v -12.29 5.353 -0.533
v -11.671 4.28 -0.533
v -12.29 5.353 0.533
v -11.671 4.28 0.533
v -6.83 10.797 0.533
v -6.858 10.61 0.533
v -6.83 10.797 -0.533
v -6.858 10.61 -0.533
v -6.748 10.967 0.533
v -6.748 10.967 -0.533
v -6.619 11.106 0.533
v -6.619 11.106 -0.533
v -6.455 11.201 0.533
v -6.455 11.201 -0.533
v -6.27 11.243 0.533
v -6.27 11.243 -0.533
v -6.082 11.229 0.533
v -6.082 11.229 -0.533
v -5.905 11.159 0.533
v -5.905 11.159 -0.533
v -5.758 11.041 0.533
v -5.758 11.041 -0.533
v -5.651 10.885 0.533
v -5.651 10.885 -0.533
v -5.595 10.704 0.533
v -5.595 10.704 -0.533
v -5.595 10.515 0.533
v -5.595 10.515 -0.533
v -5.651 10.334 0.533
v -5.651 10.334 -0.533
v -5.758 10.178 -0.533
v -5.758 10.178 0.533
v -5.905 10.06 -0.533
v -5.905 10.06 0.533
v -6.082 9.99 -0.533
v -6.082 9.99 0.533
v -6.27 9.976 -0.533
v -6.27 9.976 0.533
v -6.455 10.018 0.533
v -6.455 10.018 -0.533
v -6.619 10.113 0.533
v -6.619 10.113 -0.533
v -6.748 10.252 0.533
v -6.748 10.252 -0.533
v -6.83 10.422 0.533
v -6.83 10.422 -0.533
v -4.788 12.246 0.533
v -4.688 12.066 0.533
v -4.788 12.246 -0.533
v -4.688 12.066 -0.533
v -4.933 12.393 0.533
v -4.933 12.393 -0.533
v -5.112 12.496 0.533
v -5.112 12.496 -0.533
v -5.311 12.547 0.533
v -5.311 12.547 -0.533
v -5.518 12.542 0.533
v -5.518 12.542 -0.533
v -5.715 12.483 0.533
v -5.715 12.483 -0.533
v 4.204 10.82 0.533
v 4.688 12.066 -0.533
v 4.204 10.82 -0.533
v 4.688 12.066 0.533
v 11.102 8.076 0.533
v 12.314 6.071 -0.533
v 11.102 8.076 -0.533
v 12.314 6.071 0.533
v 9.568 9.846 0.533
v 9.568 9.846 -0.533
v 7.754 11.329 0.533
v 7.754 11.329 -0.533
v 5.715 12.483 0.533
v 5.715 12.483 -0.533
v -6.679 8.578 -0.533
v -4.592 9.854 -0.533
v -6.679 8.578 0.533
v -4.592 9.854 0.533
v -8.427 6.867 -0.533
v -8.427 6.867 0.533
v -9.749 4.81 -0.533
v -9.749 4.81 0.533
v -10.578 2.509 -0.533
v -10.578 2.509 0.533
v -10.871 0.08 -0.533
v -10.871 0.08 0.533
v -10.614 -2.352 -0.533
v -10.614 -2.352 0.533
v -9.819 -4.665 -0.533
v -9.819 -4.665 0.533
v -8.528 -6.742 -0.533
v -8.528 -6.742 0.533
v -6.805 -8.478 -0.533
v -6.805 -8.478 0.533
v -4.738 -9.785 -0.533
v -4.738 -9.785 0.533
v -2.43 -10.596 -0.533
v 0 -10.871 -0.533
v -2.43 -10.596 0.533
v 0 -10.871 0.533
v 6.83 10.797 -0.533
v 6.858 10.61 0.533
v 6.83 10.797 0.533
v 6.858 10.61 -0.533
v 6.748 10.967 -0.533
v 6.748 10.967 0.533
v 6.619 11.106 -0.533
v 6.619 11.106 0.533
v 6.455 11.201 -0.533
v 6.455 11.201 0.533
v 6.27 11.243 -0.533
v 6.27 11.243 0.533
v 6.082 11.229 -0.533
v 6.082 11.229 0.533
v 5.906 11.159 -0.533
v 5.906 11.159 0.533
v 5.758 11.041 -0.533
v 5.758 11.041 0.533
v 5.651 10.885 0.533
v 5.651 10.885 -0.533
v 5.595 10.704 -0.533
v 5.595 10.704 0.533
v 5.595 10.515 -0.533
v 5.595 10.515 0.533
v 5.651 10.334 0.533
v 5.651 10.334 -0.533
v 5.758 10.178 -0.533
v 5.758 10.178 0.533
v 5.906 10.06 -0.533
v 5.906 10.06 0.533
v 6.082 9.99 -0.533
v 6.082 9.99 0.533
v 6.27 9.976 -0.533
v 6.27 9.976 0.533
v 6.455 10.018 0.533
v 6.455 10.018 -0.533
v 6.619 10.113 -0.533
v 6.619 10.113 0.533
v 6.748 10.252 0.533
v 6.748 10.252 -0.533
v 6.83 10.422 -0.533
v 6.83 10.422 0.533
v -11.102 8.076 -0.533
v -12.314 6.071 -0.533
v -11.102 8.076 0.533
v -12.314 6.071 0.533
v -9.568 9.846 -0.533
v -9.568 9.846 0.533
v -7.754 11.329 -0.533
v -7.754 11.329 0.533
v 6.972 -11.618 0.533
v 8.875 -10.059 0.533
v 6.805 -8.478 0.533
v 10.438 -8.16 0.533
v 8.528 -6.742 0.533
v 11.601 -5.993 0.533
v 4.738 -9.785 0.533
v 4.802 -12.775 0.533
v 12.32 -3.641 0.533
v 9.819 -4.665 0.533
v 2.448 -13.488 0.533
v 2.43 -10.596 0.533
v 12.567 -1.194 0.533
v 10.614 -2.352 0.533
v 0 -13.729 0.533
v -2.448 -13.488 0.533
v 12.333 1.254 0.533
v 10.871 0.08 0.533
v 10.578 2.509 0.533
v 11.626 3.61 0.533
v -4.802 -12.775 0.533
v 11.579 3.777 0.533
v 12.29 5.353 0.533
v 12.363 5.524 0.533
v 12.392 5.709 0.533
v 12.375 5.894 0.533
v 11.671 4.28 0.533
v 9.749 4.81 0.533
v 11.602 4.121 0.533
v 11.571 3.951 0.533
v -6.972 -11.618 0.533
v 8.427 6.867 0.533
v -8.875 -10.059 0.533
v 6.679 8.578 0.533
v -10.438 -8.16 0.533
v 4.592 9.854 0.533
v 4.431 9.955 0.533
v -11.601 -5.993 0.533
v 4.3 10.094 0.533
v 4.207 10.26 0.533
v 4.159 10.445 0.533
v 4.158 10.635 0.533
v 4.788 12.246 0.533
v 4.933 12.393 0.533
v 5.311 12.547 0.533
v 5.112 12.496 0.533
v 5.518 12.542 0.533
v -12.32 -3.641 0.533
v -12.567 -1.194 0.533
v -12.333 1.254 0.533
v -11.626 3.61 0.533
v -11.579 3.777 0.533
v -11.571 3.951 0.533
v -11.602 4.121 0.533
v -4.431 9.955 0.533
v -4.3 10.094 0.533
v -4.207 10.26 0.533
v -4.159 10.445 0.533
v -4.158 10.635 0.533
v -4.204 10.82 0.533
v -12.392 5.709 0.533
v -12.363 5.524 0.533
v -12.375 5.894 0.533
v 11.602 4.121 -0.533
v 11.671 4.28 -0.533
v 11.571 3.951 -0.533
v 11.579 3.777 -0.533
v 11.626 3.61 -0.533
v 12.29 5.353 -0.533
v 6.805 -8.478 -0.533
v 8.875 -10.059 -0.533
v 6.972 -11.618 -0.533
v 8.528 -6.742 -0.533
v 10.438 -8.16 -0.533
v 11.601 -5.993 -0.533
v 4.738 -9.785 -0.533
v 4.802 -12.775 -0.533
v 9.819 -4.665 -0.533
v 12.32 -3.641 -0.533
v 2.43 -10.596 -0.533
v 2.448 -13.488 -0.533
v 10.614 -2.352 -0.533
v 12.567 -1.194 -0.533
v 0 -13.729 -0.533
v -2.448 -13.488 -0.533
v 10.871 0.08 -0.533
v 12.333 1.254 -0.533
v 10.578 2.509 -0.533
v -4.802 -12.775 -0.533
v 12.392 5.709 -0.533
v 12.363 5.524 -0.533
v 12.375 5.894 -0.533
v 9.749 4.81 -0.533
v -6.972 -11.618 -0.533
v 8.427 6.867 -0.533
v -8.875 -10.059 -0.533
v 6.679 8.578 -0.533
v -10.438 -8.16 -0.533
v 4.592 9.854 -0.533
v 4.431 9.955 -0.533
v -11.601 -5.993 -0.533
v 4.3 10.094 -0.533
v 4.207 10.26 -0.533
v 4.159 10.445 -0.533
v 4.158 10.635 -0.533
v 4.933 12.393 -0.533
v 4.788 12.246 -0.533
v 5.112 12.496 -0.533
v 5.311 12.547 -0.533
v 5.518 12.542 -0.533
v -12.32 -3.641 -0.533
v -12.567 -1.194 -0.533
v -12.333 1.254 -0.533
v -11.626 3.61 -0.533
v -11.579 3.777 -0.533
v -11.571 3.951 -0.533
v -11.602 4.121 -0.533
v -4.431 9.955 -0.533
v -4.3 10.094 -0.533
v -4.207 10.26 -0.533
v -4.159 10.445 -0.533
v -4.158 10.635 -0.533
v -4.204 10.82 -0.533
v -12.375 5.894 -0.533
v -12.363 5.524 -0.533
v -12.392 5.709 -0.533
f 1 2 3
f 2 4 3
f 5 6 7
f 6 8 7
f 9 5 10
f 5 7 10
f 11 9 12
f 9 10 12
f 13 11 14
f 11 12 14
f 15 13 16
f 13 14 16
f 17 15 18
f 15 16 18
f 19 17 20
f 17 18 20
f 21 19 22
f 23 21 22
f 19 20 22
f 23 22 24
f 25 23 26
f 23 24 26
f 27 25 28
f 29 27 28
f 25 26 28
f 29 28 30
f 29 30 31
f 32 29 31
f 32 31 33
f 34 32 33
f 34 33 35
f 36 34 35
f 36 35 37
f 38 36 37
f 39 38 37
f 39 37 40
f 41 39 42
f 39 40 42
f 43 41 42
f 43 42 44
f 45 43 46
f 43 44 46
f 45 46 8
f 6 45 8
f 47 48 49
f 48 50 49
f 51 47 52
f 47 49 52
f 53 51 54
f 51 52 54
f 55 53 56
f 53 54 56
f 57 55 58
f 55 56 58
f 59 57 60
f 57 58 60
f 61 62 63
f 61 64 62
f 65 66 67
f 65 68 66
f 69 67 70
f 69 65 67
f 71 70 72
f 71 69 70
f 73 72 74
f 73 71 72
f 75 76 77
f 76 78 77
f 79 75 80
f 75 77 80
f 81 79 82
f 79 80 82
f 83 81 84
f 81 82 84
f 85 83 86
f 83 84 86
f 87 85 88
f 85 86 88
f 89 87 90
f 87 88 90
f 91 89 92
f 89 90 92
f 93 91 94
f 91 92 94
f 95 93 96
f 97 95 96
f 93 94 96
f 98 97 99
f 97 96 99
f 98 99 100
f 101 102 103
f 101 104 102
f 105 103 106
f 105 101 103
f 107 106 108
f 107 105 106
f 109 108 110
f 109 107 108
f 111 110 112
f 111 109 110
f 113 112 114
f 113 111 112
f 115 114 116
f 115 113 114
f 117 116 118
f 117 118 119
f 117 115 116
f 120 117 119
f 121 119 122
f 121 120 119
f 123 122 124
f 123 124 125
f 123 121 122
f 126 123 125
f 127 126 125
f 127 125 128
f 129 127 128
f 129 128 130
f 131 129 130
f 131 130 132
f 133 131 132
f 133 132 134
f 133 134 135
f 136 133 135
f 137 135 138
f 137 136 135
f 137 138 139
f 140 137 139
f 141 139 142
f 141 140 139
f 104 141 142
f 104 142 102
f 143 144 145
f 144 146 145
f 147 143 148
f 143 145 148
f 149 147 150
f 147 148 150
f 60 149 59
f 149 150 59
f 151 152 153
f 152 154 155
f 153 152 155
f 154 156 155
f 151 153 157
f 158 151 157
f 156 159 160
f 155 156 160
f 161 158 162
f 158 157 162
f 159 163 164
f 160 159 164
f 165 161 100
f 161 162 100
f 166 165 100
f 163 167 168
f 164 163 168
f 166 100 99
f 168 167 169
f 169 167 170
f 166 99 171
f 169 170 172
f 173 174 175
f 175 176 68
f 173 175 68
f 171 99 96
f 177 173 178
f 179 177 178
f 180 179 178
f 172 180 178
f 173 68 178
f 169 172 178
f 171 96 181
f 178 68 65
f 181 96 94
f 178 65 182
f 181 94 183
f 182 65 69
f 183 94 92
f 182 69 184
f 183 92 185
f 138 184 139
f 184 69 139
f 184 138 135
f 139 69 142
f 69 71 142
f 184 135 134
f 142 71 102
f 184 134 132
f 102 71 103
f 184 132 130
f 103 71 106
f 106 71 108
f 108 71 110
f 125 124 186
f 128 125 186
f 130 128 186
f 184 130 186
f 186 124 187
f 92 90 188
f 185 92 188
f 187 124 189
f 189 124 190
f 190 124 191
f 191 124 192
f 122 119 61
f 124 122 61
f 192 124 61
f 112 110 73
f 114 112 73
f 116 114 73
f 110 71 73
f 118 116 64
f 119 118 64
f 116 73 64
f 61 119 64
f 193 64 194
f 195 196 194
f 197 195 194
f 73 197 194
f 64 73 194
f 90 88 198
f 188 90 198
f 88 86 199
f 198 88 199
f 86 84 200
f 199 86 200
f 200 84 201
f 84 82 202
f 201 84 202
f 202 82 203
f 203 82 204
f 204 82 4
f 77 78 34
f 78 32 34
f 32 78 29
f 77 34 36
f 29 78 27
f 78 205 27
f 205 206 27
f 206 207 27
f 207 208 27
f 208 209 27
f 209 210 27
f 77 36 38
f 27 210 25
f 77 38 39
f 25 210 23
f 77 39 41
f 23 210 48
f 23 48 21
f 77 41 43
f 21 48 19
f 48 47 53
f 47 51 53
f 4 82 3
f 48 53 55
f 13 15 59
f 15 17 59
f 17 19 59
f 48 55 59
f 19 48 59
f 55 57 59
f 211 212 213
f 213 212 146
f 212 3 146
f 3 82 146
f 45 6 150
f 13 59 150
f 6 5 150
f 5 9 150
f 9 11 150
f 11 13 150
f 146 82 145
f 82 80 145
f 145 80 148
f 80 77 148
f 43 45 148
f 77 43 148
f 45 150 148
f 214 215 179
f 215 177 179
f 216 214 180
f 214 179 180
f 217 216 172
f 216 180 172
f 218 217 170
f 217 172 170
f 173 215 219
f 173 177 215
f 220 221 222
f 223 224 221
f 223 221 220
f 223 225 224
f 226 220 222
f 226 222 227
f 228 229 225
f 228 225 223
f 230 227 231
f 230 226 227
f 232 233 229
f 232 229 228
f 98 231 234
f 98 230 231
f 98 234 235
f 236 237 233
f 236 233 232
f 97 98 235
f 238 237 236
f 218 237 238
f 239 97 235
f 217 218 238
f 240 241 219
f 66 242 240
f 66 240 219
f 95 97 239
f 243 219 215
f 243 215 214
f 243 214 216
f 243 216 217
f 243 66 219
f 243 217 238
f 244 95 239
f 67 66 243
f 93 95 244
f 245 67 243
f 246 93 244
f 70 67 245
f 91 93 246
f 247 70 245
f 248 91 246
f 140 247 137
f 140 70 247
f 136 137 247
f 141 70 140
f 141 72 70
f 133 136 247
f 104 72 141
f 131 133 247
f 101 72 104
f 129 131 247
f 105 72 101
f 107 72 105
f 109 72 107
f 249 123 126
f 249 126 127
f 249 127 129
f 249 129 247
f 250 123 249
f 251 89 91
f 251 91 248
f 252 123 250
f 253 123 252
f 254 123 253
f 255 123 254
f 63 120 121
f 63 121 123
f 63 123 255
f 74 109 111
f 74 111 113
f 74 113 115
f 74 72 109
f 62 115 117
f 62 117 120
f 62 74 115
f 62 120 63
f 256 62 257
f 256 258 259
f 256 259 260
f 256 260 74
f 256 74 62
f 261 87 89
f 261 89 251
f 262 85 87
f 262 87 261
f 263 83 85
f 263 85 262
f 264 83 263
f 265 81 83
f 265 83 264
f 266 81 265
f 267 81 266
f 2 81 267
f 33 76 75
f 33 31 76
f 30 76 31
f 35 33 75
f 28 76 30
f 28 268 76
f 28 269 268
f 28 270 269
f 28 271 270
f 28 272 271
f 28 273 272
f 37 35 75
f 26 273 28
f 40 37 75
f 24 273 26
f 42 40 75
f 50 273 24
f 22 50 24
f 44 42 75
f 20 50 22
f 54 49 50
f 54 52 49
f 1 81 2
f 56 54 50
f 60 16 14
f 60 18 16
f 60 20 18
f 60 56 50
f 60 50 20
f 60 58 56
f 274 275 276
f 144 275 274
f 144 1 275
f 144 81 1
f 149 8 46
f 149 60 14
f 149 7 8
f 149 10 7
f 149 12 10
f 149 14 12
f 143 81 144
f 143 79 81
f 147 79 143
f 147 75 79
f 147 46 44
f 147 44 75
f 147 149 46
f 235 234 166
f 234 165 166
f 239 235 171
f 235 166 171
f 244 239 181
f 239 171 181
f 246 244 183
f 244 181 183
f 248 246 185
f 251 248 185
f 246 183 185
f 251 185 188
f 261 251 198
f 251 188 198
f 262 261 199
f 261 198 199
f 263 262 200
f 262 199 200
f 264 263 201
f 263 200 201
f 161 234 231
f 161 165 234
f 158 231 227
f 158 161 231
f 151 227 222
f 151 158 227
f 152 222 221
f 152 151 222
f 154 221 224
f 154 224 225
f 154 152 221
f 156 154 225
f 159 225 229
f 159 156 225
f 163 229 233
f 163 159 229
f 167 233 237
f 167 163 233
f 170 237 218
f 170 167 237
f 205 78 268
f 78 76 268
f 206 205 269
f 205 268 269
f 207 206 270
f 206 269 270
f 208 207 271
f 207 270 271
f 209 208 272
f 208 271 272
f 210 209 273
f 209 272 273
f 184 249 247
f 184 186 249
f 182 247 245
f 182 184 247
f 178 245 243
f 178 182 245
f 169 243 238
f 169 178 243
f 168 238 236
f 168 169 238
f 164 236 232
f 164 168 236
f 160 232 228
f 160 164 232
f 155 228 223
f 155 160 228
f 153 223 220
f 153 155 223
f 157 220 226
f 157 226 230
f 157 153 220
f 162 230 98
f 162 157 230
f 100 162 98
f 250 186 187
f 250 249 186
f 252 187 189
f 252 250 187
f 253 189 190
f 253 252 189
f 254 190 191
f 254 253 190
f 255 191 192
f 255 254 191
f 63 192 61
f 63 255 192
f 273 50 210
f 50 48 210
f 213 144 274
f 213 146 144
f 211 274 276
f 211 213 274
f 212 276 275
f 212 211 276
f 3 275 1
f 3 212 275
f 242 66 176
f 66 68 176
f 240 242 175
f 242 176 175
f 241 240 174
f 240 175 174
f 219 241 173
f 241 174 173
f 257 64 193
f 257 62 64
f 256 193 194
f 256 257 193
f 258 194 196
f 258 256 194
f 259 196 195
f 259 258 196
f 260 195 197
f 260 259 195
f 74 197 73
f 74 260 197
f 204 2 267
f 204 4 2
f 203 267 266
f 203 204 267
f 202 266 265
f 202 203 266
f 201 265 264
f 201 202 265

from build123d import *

# Parameters (mm, degrees)
SKETCH1_R           = 0.635
BOSS_EXTRUDE1_DEPTH = 0.5334
FILLET1_R           = 0.762


with BuildPart() as part:
    # Sketch1 → Boss-Extrude1 (new, symmetric)
    with BuildSketch(Plane.XY):
        with BuildLine():
            Line((0, -10.8712), (0, -13.7287))
            ThreePointArc((0, -13.7287), (10.539853689, -8.005916567), (11.480547007, 3.950414898))
            Line((11.480547007, 3.950414898), (12.490007611, 5.698851952))
            ThreePointArc((12.490007611, 5.698851952), (9.424661953, 9.982632457), (4.97184229, 12.796796003))
            Line((4.97184229, 12.796796003), (3.937, 10.13326307))
            ThreePointArc((3.937, 10.13326307), (10.685123278, -2.002780562), (0, -10.8712))
        make_face()
        with Locations((6.223, 10.609573083)):
            Circle(SKETCH1_R, mode=Mode.SUBTRACT)
    extrude(amount=BOSS_EXTRUDE1_DEPTH, both=True)

    # Fillet1
    fillet1_edges = [part.edges().sort_by_distance(p)[0] for p in [
        (12.490007611, 5.698851952, 0),
        (11.480547007, 3.950414898, 0),
        (3.937, 10.13326307, 0),
        (4.97184229, 12.796796003, 0),
    ]]
    fillet(fillet1_edges, radius=FILLET1_R)

    # Mirror1: part across plane


with BuildPart() as part_1:
    add(part.part)
    add(part.part.mirror(Plane(origin=(0, 0, 0), x_dir=(0, 0, 1), z_dir=(1, 0, 0))))


solid = part_1.part
